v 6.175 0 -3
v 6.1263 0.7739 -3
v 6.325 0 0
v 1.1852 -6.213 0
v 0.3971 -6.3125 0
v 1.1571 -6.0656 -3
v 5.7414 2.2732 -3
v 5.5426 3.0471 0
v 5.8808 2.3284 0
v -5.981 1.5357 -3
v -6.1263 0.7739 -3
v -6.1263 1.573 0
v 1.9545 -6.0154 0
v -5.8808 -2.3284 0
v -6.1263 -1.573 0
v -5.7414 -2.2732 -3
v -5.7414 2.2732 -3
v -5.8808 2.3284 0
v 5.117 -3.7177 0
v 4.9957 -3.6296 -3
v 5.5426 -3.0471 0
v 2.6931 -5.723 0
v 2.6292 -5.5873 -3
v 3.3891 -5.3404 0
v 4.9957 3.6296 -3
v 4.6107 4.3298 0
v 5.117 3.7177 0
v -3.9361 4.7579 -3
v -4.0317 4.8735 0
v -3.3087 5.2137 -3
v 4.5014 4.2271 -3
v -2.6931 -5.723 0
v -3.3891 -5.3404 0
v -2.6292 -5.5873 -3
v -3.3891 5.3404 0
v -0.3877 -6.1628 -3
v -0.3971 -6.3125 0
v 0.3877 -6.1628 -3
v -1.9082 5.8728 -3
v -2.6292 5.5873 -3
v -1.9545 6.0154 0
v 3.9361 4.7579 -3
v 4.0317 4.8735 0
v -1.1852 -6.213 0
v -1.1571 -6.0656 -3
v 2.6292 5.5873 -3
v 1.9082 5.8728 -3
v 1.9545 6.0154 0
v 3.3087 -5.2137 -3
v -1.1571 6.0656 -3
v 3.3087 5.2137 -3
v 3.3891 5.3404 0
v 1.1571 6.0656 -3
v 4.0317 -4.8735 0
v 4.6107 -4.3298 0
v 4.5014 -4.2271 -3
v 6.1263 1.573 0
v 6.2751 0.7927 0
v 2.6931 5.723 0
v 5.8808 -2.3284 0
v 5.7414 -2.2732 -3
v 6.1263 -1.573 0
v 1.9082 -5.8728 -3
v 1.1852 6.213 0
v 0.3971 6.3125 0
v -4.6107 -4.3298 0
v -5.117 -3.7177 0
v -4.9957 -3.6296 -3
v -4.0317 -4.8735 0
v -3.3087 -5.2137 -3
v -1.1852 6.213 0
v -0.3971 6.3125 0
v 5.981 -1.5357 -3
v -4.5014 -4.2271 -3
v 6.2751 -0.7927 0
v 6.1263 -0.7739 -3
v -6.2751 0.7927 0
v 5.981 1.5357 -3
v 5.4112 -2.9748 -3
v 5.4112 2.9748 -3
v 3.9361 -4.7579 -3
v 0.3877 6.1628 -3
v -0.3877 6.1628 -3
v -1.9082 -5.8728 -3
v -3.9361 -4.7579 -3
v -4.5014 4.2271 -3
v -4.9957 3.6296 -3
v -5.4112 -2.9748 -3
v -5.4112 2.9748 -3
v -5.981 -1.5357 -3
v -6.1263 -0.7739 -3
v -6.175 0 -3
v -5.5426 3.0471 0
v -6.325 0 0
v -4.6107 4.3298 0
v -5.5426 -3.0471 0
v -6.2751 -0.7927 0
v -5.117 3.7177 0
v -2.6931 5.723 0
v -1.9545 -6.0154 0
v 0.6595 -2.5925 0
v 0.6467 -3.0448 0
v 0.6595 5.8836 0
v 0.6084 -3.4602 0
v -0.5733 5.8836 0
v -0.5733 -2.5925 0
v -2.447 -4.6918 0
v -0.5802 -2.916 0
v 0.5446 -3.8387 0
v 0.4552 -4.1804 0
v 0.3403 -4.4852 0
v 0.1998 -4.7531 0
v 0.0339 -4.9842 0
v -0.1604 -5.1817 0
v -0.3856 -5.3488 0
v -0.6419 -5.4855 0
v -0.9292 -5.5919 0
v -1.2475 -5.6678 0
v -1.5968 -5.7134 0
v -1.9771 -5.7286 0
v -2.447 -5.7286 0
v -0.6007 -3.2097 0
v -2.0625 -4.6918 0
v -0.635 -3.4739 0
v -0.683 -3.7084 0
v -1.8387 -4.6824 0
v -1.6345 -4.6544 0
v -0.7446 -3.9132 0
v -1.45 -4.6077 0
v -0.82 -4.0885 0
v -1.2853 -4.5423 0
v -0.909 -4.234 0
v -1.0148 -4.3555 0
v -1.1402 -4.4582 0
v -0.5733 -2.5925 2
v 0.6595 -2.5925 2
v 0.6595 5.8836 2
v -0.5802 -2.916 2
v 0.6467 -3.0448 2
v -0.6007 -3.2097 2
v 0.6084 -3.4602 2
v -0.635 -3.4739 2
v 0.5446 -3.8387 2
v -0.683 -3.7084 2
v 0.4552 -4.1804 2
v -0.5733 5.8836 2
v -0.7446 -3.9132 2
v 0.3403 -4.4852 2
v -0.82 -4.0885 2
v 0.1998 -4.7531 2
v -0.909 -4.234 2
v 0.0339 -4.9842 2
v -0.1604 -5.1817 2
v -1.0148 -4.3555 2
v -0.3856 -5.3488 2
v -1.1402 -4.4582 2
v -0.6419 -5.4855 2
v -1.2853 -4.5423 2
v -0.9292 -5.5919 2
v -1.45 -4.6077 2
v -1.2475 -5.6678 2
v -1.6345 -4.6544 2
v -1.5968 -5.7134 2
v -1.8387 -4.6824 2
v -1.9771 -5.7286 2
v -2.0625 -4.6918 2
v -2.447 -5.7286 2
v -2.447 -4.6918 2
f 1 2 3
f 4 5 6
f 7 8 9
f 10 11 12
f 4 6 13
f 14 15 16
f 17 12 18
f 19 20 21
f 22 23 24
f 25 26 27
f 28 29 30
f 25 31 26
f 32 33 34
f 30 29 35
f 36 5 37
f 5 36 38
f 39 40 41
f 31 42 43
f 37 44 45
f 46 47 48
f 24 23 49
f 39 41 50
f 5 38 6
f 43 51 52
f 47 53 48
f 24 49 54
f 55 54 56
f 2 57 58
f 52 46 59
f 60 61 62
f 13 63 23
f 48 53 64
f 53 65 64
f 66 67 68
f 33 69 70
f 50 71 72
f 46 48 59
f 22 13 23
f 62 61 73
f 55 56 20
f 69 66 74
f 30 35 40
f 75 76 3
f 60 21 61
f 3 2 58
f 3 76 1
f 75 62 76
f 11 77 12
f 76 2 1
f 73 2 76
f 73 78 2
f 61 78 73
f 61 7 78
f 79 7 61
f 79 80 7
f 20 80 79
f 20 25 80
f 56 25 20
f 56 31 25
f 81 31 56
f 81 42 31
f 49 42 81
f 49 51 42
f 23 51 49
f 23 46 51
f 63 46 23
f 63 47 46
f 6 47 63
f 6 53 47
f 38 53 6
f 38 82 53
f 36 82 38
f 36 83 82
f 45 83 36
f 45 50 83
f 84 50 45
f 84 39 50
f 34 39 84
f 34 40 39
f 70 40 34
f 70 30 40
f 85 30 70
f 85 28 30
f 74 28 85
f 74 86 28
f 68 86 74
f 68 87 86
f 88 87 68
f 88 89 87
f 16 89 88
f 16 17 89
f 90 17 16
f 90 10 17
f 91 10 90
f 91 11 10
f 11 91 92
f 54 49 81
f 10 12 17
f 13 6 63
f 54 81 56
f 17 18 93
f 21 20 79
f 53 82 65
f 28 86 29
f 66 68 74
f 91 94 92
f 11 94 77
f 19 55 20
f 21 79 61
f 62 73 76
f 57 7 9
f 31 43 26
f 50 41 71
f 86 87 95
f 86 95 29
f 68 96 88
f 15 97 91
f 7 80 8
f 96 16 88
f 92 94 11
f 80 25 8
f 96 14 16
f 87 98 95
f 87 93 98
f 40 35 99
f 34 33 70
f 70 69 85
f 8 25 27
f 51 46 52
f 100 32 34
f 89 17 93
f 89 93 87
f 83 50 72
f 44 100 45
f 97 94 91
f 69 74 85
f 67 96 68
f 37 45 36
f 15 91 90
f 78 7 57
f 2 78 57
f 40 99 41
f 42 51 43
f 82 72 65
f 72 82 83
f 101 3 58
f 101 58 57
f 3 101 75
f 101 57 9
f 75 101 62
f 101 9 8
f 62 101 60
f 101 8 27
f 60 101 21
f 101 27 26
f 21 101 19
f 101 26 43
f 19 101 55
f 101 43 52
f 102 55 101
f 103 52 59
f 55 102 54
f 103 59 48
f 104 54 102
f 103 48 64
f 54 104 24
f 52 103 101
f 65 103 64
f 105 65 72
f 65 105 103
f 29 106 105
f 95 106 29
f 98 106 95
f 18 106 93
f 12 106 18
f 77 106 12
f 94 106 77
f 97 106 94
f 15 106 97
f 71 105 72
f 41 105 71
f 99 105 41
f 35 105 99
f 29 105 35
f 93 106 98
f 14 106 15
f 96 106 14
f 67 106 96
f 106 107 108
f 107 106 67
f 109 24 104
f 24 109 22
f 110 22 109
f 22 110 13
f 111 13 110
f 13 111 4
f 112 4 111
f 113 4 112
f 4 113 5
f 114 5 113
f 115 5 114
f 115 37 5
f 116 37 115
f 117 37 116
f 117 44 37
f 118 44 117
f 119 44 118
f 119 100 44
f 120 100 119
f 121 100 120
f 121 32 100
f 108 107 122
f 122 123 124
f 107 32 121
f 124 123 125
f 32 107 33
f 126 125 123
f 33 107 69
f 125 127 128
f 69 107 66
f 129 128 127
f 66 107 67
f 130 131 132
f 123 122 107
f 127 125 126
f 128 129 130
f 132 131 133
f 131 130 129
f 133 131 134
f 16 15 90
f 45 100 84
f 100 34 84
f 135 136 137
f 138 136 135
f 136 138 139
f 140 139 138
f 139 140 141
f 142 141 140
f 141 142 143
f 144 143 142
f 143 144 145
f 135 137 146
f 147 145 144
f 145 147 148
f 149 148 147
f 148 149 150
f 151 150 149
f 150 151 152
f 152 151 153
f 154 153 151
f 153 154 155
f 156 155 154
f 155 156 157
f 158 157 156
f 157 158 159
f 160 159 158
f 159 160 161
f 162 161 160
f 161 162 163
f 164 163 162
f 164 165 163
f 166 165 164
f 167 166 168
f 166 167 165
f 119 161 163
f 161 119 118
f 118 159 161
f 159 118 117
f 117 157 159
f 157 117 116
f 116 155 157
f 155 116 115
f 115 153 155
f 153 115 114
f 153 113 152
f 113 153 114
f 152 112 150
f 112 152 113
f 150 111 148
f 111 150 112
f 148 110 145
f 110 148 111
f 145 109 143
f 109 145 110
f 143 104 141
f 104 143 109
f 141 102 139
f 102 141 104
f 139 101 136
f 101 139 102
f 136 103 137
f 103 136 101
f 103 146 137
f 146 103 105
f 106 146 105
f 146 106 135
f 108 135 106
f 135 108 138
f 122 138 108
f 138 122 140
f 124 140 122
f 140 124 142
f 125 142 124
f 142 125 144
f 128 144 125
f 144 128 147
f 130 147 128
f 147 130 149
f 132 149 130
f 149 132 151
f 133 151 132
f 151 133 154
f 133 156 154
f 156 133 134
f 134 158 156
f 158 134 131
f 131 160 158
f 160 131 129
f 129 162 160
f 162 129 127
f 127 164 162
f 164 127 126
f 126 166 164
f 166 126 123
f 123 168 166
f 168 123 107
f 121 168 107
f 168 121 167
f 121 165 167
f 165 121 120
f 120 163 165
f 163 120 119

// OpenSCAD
$fn = 50;

difference() {
	union() {
		translate(v = [0, 0, -3.0]) {
			cylinder(h = 3, r1 = 6.175, r2 = 6.325);
		}
		linear_extrude(height = 2) {
			text(font = "Wingdings", halign = "center", size = 9, text = "J", valign = "center");
		}
	}
	union();
}
